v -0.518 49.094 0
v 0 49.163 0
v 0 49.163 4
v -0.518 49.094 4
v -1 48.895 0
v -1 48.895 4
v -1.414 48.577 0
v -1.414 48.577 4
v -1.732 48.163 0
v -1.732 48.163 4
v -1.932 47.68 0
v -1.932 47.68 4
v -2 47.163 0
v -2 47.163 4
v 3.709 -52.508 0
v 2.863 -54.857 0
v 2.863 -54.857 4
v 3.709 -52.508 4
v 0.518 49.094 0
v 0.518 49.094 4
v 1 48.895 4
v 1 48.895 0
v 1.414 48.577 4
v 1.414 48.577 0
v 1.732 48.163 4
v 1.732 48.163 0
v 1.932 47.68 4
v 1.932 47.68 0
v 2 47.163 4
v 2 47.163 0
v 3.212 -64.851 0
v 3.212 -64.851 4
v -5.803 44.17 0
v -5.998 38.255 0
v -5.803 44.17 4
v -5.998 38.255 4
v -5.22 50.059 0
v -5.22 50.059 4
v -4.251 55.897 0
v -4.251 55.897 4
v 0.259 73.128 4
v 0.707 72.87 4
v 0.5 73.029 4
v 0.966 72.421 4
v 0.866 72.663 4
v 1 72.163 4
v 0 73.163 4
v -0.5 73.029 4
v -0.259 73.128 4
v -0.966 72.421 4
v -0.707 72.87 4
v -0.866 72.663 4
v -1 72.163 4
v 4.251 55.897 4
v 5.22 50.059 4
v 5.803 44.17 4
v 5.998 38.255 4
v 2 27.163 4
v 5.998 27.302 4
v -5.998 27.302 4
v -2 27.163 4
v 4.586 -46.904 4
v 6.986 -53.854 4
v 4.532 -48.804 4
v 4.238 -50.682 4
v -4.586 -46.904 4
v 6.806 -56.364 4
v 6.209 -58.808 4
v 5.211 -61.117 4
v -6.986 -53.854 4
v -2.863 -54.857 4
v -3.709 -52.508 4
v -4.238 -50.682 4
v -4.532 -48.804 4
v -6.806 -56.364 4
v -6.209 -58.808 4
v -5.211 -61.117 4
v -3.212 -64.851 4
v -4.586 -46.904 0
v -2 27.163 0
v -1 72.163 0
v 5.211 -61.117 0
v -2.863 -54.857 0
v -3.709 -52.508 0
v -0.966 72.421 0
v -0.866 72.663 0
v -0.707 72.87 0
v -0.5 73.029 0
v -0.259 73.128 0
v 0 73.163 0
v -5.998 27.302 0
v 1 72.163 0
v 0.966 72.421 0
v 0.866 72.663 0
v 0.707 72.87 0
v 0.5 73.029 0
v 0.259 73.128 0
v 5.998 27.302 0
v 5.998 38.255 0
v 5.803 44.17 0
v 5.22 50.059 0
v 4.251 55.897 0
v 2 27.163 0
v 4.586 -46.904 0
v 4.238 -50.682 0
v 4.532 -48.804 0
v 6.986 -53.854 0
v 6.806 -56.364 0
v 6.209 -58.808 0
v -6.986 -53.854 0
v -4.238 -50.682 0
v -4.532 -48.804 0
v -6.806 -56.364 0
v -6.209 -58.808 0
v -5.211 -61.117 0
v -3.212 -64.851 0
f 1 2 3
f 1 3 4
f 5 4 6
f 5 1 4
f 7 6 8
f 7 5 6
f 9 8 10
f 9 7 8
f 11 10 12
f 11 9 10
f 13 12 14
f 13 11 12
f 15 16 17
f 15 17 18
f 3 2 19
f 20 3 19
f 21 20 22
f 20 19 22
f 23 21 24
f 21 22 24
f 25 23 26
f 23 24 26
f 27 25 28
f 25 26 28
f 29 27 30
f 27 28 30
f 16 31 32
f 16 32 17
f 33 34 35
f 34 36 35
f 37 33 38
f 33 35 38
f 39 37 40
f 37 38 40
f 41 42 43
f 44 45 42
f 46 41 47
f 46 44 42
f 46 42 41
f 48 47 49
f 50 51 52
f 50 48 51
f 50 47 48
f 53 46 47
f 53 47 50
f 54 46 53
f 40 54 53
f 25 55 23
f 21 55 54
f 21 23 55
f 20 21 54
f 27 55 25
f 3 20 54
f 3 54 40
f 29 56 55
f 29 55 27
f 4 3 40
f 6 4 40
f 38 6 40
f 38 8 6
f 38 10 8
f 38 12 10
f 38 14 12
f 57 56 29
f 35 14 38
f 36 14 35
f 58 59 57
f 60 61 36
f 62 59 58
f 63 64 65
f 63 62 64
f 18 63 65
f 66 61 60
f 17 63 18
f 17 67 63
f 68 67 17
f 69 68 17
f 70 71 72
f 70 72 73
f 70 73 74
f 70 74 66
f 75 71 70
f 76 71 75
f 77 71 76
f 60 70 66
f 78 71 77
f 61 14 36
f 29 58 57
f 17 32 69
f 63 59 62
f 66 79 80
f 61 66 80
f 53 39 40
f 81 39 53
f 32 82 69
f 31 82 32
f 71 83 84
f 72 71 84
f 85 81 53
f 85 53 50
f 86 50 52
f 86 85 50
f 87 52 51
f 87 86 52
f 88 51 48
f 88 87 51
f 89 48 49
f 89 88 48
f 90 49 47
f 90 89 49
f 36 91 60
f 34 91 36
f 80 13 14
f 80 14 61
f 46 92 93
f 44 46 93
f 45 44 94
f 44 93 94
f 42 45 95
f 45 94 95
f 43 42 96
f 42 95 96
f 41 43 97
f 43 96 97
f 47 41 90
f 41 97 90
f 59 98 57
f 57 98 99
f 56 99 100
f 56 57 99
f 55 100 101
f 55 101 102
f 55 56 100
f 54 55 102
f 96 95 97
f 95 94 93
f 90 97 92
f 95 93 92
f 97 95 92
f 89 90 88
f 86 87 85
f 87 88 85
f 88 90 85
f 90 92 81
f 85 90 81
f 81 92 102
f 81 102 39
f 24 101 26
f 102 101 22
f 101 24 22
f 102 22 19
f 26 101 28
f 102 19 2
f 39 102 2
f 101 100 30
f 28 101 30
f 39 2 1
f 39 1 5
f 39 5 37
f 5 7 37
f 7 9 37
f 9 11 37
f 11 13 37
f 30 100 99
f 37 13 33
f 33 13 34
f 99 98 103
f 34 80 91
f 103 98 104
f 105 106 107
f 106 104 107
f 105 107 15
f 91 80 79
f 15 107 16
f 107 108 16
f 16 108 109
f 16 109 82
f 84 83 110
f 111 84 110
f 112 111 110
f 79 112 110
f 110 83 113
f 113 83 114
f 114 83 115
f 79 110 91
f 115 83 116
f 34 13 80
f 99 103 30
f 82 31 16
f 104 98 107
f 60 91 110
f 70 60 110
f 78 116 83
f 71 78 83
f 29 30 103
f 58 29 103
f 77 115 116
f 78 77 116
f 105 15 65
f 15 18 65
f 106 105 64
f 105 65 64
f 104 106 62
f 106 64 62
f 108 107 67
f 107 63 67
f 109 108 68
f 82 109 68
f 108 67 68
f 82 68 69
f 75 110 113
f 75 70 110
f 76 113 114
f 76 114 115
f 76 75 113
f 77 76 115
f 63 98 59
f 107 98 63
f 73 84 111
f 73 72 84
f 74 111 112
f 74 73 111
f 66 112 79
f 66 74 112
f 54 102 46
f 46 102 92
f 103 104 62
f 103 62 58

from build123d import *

# Parameters (mm, degrees)
F1_DEPTH = 4
F2_R     = 15
F3_ANGLE = 2
F5_DEPTH = 4
F7_R     = 90


with BuildPart() as f1:
    # F0 (on Top) → F1 (new body)
    with BuildSketch(Plane.XY):
        Polygon((0, -64.8374632001), (0, -54.8374632001), (-2, -49.8374632001), (-2, 27.1625367999), (-6, 27.1625367999), (-4.0681642161, -57.8382376935), align=None)
    extrude(amount=F1_DEPTH)

    # F2
    f2_edges = [f1.edges().sort_by_distance(p)[0] for p in [
        (-4.068164, -57.838238, 2),
        (-2, -49.837463, 2),
    ]]
    fillet(f2_edges, radius=F2_R)


with BuildPart() as f1_1:
    # F3: moved
    add(f1.part.rotate(Axis((-2, 27.1625367999, 2), (0, 0, -1)), F3_ANGLE))

    # F4 (on face) → F5 (join)
    with BuildSketch(Plane(origin=(0, 0, 0), x_dir=(1, 0, 0), z_dir=(0, 0, -1))):
        with BuildLine():
            Line((-2, -47.1625367999), (-2, -27.1625367999))
            Line((-2, -27.1625367999), (-5.9975633081, -27.3021347867))
            Line((-5.9975633081, -27.3021347867), (-5.9975633081, -47.1625367999))
            Line((-5.9975633081, -47.1625367999), (-1, -72.1625367999))
            ThreePointArc((-1, -72.1625367999), (-0.7071067812, -72.8696435811), (0, -73.1625367999))
            Line((0, -73.1625367999), (0, -49.1625367999))
            ThreePointArc((0, -49.1625367999), (-1.4142135624, -48.5767503623), (-2, -47.1625367999))
        make_face()
    extrude(amount=-F5_DEPTH)

    # F6: F1 across plane


with BuildPart() as f1_2:
    add(f1_1.part)
    add(f1_1.part.mirror(Plane.YZ))

    # F7
    f7_edges = [f1_2.edges().sort_by_distance(p)[0] for p in [
        (-5.997563, 47.162537, 2),
        (5.997563, 47.162537, 2),
    ]]
    fillet(f7_edges, radius=F7_R)


solid = f1_2.part
